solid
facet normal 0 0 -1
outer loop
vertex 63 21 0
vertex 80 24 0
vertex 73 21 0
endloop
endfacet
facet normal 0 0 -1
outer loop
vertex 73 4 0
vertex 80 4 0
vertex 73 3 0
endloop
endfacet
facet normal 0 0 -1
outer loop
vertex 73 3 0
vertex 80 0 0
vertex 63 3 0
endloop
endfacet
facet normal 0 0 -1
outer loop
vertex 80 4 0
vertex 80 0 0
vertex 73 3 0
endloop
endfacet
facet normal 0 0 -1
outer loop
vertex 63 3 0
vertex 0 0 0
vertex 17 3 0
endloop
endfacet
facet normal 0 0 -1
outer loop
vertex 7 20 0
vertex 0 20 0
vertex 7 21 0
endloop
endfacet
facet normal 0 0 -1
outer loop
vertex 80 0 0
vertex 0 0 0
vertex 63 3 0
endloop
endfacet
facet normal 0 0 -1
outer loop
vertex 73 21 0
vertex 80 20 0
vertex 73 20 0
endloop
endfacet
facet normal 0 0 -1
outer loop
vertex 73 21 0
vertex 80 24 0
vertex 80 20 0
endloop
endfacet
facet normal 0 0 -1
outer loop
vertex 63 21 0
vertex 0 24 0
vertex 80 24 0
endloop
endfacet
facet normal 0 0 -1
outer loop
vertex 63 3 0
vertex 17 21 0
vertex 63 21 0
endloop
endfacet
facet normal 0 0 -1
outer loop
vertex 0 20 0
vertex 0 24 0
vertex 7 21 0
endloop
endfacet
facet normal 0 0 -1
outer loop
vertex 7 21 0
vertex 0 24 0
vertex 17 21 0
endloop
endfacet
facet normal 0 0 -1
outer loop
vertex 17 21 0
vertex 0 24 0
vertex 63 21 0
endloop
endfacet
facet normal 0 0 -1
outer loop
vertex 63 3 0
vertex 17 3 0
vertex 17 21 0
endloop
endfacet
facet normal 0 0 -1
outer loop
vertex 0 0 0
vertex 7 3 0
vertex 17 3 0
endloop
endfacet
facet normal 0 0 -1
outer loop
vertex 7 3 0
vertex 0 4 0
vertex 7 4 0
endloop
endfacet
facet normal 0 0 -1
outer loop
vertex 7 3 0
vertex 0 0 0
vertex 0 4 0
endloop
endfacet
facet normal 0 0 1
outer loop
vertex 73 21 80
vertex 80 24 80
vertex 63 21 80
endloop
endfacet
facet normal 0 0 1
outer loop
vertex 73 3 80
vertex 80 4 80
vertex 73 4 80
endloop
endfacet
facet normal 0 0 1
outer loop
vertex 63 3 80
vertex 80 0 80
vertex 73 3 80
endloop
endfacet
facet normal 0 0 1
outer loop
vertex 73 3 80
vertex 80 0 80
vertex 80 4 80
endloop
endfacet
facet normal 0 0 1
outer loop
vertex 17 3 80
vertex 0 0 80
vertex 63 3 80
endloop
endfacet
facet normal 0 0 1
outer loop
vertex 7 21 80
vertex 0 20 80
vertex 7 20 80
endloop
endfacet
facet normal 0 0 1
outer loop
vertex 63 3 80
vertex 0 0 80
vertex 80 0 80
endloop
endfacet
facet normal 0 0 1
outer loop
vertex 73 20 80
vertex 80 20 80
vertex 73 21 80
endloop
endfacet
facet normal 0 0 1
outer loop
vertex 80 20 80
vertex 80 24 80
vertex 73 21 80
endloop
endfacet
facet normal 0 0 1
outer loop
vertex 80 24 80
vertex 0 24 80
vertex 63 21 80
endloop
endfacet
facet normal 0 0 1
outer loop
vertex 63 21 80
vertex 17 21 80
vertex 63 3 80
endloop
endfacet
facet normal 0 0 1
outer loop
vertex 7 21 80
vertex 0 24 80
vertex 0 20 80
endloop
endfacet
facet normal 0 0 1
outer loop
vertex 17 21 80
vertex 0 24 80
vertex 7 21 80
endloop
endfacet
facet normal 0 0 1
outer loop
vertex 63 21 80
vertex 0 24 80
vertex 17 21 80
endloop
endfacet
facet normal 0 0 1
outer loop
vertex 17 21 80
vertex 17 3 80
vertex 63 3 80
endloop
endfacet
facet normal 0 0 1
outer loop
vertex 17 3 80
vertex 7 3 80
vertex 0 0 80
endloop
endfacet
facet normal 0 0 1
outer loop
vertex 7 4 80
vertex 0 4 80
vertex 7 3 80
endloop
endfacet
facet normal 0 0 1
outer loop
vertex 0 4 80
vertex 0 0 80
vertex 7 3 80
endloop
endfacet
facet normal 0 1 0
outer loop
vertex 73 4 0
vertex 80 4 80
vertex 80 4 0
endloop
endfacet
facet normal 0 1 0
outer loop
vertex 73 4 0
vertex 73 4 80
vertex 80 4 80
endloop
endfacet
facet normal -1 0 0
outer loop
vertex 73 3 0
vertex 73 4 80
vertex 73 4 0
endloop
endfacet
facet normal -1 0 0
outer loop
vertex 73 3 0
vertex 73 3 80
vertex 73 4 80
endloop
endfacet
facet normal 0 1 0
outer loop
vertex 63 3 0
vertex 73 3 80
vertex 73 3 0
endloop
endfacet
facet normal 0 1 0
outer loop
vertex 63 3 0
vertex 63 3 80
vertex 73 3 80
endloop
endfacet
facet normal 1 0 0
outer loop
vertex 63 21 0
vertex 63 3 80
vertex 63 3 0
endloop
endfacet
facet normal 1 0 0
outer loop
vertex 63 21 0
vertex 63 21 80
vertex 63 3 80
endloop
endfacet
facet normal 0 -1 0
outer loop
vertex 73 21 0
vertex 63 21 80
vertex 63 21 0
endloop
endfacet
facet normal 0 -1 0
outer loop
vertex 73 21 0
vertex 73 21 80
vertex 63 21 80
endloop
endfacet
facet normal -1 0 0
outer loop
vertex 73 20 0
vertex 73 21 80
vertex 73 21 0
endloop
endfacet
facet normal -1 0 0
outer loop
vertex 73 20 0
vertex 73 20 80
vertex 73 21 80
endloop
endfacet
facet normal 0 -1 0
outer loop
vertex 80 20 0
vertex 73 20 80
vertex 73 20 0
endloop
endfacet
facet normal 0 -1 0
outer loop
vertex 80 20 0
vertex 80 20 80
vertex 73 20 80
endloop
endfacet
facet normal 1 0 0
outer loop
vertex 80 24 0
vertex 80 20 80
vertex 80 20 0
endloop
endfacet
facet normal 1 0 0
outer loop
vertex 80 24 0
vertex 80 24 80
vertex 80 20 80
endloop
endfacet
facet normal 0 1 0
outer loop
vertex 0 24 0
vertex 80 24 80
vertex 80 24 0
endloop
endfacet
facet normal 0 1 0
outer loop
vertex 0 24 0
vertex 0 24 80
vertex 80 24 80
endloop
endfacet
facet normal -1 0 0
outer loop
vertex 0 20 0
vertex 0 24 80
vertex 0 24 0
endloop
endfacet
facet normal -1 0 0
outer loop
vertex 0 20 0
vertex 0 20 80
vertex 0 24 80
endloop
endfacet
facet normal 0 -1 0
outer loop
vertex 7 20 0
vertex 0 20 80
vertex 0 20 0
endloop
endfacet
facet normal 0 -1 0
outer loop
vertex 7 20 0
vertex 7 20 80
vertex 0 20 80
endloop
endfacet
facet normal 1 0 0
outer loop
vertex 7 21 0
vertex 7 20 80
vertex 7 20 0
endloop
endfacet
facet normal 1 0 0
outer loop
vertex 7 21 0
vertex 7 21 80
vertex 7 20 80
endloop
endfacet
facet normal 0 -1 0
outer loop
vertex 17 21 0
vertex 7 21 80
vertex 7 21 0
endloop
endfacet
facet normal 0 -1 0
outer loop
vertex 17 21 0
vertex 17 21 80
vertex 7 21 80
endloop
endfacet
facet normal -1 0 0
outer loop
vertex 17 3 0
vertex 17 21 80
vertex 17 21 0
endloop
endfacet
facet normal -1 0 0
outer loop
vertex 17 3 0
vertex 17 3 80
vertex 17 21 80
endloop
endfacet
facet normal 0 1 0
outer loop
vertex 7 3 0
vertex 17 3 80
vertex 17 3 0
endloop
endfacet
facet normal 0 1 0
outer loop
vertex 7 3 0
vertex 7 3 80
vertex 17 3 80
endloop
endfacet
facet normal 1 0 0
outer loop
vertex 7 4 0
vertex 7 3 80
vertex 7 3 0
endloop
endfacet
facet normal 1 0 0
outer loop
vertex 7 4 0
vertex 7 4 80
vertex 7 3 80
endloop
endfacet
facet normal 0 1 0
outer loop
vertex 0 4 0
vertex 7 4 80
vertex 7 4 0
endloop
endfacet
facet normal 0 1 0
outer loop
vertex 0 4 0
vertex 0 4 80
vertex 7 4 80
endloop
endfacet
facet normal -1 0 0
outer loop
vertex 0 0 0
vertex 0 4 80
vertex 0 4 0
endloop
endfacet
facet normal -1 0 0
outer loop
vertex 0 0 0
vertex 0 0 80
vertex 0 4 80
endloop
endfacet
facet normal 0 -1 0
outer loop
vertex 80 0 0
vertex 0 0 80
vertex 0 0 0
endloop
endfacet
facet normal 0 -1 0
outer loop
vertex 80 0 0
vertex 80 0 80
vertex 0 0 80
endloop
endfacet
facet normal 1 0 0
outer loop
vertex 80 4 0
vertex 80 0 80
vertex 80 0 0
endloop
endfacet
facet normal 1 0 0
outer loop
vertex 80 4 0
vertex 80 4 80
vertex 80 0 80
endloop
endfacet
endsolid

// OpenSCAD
$fn = 32;

// ----------------------------------------------------------------------
// T-slot rail: 80 x 24 mm section, 80 mm long
// ----------------------------------------------------------------------

// --- parameters (mm) ---
profile_height = 80;      // extrusion height
profile_points = 20;      // points of the closed outline

profile = [[0, 0], [80, 0], [80, 4], [73, 4], [73, 3], [63, 3], [63, 21], [73, 21], [73, 20], [80, 20], [80, 24], [0, 24], [0, 20], [7, 20], [7, 21], [17, 21], [17, 3], [7, 3], [7, 4], [0, 4]];  // single closed polygon, 20 points, counter clockwise

// --- the one profile operation ---
linear_extrude(height = profile_height) polygon(points = profile);
